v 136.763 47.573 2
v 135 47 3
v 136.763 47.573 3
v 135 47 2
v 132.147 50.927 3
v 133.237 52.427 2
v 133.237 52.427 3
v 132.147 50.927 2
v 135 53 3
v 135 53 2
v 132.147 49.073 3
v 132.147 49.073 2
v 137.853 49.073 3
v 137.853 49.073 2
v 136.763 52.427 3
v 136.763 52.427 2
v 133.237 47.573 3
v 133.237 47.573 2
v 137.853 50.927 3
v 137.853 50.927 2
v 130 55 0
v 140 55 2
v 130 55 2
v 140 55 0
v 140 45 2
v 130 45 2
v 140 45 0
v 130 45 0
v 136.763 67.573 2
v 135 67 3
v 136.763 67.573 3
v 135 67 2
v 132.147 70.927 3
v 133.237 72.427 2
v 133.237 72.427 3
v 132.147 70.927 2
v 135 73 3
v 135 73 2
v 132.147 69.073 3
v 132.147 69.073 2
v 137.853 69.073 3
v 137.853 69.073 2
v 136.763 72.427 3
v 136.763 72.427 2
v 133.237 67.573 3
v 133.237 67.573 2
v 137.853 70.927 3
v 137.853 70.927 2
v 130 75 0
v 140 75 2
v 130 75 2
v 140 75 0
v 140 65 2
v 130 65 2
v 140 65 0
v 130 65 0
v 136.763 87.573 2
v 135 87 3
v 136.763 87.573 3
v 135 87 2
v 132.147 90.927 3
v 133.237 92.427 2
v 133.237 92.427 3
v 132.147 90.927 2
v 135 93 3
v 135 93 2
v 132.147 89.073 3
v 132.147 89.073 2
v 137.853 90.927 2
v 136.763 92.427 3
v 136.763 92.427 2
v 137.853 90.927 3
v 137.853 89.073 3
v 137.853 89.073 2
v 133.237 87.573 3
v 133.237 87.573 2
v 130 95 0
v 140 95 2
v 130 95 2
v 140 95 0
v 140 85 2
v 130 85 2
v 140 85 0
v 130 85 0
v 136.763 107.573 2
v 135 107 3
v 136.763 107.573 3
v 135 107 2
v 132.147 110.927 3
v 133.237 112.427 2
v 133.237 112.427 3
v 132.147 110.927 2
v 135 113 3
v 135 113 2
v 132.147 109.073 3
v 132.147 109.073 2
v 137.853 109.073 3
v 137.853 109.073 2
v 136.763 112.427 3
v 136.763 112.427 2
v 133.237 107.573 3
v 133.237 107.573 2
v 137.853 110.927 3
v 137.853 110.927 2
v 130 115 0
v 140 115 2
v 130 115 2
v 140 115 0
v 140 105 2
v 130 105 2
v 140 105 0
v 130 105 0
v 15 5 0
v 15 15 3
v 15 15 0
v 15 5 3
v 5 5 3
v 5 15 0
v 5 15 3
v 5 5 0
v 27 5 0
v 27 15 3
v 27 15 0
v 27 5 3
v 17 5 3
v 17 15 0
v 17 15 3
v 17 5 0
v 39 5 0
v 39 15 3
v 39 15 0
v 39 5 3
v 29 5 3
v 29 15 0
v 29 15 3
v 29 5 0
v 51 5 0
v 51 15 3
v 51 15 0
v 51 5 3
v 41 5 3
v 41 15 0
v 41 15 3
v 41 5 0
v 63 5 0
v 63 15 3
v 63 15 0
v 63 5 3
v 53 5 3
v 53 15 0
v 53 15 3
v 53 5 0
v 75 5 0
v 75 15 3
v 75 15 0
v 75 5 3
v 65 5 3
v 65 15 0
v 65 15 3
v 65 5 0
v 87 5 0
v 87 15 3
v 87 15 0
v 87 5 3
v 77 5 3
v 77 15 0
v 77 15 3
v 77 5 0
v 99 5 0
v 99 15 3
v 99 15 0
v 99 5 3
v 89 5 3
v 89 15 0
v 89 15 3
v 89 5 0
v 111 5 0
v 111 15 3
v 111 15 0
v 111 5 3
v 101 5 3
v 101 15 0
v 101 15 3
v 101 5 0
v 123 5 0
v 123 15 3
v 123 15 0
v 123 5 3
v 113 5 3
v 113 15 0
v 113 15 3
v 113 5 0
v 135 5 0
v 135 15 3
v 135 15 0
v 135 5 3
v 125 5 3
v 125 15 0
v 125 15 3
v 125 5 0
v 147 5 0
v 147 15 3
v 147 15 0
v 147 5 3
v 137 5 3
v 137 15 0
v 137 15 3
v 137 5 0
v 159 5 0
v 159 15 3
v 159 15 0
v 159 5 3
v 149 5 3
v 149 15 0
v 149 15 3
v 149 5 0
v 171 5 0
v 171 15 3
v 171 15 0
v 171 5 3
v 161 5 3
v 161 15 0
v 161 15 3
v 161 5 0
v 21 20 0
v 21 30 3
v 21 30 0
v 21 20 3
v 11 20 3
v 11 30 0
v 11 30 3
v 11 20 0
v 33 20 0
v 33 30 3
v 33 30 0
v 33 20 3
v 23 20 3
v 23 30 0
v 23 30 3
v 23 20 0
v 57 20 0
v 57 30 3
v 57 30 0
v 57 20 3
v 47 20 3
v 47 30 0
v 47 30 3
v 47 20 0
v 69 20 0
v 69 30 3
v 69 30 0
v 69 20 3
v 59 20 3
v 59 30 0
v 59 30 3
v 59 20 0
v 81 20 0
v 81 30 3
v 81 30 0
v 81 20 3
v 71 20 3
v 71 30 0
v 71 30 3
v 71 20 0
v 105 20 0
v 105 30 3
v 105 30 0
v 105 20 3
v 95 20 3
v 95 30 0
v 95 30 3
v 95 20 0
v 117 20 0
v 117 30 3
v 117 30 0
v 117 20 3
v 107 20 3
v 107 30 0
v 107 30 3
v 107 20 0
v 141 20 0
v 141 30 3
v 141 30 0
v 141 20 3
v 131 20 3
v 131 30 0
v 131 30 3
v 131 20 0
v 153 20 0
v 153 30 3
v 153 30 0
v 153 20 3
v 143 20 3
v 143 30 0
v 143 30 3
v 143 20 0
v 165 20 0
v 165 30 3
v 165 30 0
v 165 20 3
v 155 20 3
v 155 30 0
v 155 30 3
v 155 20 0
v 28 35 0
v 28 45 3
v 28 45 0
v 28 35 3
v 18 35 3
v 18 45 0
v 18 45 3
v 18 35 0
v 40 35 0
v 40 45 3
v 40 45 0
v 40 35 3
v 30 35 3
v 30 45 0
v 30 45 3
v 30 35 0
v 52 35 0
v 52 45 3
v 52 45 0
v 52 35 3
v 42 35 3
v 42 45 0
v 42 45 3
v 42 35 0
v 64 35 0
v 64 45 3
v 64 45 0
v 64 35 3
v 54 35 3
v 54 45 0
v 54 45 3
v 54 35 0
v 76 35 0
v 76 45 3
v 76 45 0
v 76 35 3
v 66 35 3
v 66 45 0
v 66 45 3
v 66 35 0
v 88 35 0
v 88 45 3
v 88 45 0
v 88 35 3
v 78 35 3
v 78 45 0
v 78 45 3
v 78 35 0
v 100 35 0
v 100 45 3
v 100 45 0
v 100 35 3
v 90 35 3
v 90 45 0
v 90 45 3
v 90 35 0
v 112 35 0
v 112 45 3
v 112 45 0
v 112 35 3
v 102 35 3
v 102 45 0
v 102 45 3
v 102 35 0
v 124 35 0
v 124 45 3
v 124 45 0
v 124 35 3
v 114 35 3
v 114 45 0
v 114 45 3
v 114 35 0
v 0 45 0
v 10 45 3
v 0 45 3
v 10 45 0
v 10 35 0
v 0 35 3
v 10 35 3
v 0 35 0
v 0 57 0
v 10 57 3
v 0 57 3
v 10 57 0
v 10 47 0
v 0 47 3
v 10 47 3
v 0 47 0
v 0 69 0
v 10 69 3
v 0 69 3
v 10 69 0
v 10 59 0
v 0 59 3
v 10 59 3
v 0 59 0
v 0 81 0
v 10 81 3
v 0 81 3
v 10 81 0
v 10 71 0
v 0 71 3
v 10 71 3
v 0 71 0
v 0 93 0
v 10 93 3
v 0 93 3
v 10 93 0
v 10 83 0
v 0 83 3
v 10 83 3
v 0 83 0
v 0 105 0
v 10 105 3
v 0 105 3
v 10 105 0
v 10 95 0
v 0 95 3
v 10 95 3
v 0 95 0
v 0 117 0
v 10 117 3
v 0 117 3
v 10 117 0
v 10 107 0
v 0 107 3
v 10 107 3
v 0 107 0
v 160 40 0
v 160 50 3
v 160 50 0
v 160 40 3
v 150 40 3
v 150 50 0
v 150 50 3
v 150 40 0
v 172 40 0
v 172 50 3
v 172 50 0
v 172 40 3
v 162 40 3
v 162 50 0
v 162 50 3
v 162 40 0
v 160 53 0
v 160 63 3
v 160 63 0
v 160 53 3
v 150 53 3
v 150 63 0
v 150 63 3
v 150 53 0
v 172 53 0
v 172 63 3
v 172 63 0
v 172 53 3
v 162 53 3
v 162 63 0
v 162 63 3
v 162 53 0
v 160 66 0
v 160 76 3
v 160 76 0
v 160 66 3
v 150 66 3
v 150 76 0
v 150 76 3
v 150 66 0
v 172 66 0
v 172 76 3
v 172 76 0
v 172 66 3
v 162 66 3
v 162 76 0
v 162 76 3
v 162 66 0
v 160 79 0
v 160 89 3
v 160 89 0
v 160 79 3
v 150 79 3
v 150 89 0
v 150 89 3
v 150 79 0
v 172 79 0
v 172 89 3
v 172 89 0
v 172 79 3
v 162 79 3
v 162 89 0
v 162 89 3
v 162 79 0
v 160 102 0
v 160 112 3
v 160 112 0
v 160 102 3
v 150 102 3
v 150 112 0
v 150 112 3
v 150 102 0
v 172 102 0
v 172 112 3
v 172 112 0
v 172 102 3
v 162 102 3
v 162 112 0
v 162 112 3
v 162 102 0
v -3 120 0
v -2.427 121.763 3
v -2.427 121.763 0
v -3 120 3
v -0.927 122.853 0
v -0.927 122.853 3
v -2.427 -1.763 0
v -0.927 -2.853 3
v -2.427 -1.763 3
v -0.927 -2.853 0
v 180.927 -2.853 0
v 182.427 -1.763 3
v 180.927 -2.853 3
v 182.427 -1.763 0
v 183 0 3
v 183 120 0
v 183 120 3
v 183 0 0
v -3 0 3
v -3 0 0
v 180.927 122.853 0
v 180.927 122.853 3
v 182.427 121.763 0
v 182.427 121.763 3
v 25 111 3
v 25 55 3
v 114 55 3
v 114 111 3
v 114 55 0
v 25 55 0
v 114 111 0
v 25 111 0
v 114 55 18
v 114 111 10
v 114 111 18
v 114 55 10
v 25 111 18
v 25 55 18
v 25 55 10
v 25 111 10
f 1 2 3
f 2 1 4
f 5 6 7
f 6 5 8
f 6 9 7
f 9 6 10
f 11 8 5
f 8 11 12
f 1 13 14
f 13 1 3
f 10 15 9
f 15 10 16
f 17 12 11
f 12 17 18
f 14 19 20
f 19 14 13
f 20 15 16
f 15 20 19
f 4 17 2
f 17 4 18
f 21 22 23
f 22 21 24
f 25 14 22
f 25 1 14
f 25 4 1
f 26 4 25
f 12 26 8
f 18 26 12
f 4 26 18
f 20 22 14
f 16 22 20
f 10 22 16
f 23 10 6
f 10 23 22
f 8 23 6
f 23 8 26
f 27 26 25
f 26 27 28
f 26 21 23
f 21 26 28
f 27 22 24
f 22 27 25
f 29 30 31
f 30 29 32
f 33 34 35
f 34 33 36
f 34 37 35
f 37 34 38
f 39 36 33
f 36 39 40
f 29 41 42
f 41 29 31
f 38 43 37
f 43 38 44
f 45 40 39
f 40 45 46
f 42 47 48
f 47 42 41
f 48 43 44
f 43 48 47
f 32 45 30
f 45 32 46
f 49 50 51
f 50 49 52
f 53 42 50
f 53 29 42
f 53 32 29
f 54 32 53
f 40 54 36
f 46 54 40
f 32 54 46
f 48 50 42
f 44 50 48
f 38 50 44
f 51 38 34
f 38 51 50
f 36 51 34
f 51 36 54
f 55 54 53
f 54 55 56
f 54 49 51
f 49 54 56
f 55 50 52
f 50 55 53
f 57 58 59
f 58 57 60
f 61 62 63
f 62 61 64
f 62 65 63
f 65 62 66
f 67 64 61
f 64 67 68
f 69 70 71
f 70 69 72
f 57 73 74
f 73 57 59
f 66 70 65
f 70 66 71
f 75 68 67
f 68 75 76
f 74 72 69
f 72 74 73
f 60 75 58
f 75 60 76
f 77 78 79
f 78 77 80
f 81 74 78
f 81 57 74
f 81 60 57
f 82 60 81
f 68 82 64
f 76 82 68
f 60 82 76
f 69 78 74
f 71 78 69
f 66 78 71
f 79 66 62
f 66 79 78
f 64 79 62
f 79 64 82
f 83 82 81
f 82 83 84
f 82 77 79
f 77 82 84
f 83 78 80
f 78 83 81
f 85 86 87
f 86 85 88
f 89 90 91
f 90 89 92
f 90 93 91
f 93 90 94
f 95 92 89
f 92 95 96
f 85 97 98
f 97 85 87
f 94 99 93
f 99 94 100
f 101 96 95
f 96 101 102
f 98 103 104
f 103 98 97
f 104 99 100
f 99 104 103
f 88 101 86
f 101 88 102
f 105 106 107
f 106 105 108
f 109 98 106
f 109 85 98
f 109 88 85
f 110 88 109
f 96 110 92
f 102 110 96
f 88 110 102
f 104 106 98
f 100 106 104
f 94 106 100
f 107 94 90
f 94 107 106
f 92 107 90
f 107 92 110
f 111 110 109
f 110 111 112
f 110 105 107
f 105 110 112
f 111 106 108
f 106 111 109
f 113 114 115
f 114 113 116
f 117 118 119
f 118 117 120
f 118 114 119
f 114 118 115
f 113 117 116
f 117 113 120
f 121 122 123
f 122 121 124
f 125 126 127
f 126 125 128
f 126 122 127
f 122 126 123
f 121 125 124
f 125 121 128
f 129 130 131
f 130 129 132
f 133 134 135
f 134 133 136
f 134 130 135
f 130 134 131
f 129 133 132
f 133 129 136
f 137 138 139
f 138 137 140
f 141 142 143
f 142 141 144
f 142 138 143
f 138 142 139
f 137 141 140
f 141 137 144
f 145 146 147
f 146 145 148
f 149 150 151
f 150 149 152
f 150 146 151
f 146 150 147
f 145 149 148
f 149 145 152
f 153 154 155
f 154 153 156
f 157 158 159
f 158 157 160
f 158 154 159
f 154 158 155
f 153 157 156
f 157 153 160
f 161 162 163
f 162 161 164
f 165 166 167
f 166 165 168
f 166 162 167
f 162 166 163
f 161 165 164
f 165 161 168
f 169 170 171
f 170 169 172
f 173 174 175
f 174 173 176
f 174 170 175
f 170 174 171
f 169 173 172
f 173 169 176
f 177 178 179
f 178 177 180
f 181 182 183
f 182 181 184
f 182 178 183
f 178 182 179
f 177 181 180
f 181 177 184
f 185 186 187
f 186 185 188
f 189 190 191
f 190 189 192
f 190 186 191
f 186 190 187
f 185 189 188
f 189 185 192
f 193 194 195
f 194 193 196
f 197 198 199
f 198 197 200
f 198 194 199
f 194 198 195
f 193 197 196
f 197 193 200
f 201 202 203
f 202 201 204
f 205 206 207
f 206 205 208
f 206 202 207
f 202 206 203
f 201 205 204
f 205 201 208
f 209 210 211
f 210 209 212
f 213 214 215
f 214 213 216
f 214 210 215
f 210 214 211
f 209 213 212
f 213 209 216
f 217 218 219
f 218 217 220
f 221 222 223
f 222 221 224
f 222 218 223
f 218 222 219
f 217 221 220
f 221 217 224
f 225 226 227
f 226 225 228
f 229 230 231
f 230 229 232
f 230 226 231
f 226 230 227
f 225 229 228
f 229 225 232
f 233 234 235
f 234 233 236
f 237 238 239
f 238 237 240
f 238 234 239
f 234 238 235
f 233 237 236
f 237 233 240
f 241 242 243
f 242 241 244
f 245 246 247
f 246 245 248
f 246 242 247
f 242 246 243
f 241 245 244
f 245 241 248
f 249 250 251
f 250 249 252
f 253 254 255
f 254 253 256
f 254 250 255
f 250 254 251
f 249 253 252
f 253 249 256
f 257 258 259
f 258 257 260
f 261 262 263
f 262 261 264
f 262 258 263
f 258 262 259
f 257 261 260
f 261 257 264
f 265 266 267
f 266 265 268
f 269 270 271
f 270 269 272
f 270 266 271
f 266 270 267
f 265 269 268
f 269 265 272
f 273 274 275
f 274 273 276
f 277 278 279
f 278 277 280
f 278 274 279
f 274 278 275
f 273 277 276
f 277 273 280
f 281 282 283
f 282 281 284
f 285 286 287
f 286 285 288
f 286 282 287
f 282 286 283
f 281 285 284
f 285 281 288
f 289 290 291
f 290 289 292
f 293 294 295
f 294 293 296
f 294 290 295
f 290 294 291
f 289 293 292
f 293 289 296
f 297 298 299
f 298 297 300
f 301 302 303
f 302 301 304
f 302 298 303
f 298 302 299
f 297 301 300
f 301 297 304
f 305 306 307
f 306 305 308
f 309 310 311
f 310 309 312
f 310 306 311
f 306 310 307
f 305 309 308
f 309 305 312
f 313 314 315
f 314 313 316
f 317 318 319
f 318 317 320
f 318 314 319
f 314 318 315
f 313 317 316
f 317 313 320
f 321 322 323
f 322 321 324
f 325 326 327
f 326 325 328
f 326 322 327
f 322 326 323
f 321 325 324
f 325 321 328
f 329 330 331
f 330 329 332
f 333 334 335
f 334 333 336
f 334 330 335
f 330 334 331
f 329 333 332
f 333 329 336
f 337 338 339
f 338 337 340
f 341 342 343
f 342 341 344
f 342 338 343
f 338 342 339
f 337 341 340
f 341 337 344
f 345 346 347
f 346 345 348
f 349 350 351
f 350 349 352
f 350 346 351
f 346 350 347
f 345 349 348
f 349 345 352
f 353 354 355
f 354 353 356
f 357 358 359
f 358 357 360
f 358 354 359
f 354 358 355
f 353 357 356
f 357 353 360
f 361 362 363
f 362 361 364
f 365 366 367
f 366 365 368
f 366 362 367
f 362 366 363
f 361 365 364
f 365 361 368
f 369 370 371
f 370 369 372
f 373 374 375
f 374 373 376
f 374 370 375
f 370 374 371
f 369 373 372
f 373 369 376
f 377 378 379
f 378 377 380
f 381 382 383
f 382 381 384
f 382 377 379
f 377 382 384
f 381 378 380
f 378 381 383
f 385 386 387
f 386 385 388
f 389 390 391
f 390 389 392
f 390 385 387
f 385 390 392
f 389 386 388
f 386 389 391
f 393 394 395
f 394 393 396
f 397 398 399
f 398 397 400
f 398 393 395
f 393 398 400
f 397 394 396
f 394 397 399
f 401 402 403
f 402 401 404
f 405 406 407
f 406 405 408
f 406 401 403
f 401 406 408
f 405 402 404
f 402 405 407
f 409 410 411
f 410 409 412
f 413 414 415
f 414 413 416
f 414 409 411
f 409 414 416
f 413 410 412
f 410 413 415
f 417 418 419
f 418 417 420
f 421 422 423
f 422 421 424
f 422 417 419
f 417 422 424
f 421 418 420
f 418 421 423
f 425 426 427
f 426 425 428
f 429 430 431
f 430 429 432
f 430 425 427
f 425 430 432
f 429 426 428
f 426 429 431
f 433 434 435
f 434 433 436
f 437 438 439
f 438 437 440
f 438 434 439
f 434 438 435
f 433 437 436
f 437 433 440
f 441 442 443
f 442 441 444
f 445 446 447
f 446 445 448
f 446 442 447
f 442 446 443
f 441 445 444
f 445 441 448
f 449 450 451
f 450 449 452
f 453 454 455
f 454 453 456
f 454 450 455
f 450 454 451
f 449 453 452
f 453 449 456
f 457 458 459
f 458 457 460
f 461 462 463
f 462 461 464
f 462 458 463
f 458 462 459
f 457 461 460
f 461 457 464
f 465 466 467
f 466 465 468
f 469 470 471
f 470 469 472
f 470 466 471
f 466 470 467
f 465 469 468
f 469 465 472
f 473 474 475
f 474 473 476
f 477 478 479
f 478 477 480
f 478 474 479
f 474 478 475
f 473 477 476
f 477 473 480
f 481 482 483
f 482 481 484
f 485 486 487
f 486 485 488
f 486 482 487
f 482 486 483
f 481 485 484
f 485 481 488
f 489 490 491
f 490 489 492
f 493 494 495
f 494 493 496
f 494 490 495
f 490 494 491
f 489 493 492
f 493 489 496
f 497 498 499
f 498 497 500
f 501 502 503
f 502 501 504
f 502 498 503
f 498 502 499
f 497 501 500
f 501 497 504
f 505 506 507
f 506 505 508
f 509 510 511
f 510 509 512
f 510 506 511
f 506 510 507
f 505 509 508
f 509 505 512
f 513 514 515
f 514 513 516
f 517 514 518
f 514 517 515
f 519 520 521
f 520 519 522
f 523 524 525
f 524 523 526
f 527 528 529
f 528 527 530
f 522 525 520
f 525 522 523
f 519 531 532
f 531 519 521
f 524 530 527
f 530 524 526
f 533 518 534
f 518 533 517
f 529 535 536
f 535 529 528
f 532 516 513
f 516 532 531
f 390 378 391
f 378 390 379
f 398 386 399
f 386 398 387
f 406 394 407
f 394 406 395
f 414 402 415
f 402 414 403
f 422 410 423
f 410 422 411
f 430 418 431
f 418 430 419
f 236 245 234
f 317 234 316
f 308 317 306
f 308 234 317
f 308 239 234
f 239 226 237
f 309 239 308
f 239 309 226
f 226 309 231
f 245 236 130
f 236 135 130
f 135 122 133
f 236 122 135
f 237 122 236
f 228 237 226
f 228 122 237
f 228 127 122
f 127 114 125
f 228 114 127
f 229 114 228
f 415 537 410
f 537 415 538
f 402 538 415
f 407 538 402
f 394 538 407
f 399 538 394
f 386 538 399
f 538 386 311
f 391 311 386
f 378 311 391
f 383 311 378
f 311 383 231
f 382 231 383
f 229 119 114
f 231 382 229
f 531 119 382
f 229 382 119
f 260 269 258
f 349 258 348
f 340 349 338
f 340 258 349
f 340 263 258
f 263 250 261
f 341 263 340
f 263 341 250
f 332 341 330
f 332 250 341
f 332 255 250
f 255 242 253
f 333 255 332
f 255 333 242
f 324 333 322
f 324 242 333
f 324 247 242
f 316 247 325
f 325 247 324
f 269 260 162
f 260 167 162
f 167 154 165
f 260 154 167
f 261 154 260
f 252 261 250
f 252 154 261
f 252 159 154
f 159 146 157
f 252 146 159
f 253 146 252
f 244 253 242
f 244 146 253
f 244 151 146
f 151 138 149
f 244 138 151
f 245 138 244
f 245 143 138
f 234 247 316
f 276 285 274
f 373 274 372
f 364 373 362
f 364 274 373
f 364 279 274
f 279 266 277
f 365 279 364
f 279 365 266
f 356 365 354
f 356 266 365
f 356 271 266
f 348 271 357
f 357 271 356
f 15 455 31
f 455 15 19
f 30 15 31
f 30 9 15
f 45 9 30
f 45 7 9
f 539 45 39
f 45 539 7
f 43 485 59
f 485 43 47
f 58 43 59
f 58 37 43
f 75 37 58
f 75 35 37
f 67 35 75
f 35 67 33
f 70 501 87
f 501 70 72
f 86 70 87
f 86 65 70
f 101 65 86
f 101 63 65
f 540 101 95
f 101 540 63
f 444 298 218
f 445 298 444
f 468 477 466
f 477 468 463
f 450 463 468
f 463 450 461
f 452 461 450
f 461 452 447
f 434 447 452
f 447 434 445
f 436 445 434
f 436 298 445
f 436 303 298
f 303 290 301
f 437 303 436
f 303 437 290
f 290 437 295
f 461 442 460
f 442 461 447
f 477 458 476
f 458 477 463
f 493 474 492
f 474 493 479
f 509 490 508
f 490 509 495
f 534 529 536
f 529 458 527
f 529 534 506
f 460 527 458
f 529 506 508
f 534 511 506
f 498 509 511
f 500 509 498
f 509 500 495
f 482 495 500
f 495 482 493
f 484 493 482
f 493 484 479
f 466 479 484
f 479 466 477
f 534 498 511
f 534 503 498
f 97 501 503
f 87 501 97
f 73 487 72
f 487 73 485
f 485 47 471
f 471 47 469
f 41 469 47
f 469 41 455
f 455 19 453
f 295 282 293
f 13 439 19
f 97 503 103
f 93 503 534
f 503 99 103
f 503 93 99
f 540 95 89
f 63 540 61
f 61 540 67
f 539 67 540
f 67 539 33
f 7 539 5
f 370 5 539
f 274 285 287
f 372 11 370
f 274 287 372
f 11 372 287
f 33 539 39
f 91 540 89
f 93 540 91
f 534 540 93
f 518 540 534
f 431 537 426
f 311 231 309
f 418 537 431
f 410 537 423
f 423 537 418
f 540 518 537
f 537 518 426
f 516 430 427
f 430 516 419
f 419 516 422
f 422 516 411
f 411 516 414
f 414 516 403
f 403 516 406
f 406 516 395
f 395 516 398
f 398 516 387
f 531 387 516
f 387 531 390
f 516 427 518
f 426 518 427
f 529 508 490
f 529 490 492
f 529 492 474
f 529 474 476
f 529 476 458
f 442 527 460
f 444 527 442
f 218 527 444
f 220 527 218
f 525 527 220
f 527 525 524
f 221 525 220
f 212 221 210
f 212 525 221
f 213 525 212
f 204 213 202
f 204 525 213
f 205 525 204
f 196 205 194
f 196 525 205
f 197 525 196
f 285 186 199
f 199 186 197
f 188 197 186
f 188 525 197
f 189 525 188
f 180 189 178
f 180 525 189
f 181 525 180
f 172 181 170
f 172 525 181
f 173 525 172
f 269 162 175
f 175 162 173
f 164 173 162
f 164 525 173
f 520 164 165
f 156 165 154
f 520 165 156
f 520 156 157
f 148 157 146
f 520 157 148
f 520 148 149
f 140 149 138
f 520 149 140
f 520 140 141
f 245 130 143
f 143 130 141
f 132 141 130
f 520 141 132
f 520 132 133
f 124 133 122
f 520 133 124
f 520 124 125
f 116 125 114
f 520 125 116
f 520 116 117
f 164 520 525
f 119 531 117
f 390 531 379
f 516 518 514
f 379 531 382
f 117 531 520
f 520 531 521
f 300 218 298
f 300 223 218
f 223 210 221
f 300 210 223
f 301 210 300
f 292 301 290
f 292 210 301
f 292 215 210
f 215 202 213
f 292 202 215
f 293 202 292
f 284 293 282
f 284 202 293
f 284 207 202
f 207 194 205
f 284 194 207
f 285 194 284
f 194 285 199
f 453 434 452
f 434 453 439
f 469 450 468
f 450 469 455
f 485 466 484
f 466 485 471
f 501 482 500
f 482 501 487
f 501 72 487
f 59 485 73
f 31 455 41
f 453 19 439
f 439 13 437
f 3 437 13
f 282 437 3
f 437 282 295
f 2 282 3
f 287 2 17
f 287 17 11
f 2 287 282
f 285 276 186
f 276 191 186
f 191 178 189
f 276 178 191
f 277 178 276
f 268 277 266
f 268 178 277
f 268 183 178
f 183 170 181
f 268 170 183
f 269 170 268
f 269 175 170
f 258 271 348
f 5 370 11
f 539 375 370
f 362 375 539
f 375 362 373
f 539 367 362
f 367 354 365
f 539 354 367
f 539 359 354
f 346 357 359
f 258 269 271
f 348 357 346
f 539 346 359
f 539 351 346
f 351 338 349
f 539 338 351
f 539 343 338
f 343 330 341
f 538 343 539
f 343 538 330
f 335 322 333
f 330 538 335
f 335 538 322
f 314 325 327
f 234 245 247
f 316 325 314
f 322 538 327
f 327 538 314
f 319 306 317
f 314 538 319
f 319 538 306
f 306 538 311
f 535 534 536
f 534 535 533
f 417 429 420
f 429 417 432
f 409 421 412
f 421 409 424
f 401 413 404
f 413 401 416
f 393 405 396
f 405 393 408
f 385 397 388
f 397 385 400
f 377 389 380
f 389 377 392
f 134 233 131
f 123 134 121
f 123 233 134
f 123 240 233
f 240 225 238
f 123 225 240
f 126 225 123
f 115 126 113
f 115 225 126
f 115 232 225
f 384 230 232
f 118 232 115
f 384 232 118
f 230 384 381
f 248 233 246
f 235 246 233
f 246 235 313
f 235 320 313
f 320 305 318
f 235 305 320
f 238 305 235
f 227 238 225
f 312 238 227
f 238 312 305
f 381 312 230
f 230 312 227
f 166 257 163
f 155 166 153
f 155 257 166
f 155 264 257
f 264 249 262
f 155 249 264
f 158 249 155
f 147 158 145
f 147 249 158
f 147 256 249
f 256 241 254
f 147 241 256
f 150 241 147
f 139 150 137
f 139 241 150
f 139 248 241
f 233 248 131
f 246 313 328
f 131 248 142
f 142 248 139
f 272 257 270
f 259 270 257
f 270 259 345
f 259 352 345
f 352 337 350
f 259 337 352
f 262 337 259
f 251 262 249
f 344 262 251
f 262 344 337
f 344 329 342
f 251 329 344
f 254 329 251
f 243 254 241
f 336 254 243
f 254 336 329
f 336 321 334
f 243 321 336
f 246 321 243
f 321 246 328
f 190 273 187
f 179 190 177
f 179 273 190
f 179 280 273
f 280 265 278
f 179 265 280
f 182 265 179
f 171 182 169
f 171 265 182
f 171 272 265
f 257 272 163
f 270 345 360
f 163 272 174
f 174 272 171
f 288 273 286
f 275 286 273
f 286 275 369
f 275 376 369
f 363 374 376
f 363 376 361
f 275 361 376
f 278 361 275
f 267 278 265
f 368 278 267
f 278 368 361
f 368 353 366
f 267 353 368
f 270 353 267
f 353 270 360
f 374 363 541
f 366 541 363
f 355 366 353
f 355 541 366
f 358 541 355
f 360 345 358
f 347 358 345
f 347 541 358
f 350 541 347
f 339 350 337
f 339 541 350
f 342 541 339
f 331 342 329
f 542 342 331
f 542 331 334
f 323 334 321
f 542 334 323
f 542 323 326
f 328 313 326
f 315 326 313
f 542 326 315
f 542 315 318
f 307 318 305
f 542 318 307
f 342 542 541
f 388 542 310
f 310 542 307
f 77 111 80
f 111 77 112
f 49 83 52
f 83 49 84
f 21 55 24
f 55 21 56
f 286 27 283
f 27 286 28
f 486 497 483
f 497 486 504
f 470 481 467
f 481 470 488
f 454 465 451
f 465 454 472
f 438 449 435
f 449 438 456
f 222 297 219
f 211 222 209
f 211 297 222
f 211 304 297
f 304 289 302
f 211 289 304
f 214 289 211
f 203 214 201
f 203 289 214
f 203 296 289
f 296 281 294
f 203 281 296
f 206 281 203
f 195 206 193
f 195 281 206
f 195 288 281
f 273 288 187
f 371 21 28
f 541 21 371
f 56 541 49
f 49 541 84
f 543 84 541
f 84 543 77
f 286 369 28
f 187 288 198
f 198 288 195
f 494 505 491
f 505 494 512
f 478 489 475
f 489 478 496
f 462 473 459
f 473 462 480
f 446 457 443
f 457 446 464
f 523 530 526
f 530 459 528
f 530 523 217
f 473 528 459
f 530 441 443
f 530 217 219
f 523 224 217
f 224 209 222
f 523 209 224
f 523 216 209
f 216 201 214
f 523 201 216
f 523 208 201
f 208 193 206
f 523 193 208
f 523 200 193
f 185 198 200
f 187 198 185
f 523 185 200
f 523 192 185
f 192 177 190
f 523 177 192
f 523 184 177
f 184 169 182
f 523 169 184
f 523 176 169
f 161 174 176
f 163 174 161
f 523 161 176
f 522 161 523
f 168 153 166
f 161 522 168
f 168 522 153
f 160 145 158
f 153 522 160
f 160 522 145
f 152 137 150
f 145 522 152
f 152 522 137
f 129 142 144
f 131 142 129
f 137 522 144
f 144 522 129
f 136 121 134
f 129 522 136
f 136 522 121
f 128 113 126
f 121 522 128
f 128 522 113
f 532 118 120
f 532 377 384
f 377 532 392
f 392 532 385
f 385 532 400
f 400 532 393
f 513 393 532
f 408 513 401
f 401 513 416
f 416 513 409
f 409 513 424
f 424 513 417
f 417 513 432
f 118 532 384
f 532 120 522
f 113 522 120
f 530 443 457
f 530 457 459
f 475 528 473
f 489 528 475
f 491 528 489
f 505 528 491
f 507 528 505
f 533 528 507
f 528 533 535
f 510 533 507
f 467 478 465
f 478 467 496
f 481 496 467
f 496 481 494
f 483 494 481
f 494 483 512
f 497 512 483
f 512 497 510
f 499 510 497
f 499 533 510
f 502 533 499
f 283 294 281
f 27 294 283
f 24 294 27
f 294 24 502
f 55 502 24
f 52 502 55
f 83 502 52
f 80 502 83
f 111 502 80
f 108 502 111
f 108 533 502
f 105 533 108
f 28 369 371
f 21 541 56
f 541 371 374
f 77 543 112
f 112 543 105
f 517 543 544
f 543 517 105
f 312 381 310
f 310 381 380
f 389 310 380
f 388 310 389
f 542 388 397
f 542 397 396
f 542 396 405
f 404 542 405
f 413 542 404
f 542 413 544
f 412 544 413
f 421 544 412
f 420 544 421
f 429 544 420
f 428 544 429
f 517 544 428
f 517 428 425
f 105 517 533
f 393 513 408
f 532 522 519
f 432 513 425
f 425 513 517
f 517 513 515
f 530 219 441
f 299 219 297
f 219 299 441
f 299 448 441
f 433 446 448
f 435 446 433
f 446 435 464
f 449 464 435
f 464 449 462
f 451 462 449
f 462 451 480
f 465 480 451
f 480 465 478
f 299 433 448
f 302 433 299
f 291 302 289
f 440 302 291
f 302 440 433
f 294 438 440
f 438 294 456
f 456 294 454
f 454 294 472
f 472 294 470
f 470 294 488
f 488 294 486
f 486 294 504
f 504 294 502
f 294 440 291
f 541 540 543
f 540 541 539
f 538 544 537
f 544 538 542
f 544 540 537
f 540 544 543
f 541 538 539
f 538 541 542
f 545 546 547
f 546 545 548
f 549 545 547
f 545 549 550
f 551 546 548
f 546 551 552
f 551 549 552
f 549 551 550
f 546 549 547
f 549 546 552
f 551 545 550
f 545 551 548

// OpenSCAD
box = [180,120,90];
screen = [89,56,8];
screenpos = [25,55,10];
midipos = [-85,-5,0];
leftkeyspos = [8,-10,0];
leftkeys2pos = [70,25,0];
leftkeys2rot = [0,0,90];
rightkeyspos = [-85,-20,0];
encoderpos = [230,15,0];
encoderrot = [0,0,90];
button = [10,10];

keyboardbuttonholes = [[90,10,-3],[102,10,-3],[114,10,-3],[126,10,-3],[138,10,-3],[150,10,-3],[162,10,-3],[174,10,-3],[186,10,-3],
                         [198,10,-3],[210,10,-3],[222,10,-3],[234,10,-3],[246,10,-3],
                         [96,25,-3],[108,25,-3],[132,25,-3],[144,25,-3],[156,25,-3],[180,25,-3],[192,25,-3],[216,25,-3],[228,25,-3],[240,25,-3]];
                         
keyleftbuttonholes = [[10,45,-3],[22,45,-3],[34,45,-3],[46,45,-3],[58,45,-3],[70,45,-3],[82,45,-3],[94,45,-3],[106,45,-3],
                                    /*[10,75,-3], [10,90,-3]*/];
                                    
keyleftbuttonholes2 = [  [10,60,-3], [22,60,-3], [34,60,-3], [46,60,-3], [58,60,-3], [70,60,-3], [82,60,-3], /*[94,60,-3], [106,60,-3],*/];
                                    
keyrightbuttonholes = [[235,60,-3],[247,60,-3],
                                      [235,73,-3],[247,73,-3],
                                       [235,86,-3],[247,86,-3],
                                       [235,99,-3],[247,99,-3],
                                       [235,122,-3],[247,122,-3],];      
         
encoderholes = [[35,95,-3],[55,95,-3],[75,95,-3],[95,95,-3],
                            /*[45,80,-3],[65,80,-3],[85,80,-3],[105,80,-3]*/];

module rounded_rect(x, y, z, radius) {
	echo("Draw Rounded Rectangle.");
	linear_extrude(height=z)
		minkowski() {
			square([x,y]);
			circle(r = radius);
		}
}

//rounded_rect(box[0],box[1],3,5);


translate([0,0,0]){
    color("Blue",1.0){
    translate(screenpos){ cube(screen);}
    }
    difference(){
    rounded_rect(box[0],box[1],3,3);
     
    translate([0,0,-12]){    
    translate(screenpos){ cube(screen);}    
    }
    
  
    translate(encoderpos){
          rotate(encoderrot){
    for (hole = encoderholes){    
        translate(hole){    
            #cylinder(20,3,3,false);
            cube([button[0],button[1],10],true);
        }
        }
    }
}
      
        
    translate(midipos){    
    for (hole = keyboardbuttonholes){    
        translate(hole)    
            cube([button[0],button[1],10]);
        }
    }
    translate(leftkeyspos){  
     for (hole = keyleftbuttonholes){    
        translate(hole)    
            cube([button[0],button[1],10]);
        }
    }
     translate(leftkeys2pos){  
         rotate(leftkeys2rot){
     for (hole = keyleftbuttonholes2){    
        translate(hole)    
            cube([button[0],button[1],10]);
        }
    }
}
    
      translate(rightkeyspos){     
      for (hole = keyrightbuttonholes){    
        translate(hole)    
            cube([button[0],button[1],10]);
        }
    } 
    }
}
